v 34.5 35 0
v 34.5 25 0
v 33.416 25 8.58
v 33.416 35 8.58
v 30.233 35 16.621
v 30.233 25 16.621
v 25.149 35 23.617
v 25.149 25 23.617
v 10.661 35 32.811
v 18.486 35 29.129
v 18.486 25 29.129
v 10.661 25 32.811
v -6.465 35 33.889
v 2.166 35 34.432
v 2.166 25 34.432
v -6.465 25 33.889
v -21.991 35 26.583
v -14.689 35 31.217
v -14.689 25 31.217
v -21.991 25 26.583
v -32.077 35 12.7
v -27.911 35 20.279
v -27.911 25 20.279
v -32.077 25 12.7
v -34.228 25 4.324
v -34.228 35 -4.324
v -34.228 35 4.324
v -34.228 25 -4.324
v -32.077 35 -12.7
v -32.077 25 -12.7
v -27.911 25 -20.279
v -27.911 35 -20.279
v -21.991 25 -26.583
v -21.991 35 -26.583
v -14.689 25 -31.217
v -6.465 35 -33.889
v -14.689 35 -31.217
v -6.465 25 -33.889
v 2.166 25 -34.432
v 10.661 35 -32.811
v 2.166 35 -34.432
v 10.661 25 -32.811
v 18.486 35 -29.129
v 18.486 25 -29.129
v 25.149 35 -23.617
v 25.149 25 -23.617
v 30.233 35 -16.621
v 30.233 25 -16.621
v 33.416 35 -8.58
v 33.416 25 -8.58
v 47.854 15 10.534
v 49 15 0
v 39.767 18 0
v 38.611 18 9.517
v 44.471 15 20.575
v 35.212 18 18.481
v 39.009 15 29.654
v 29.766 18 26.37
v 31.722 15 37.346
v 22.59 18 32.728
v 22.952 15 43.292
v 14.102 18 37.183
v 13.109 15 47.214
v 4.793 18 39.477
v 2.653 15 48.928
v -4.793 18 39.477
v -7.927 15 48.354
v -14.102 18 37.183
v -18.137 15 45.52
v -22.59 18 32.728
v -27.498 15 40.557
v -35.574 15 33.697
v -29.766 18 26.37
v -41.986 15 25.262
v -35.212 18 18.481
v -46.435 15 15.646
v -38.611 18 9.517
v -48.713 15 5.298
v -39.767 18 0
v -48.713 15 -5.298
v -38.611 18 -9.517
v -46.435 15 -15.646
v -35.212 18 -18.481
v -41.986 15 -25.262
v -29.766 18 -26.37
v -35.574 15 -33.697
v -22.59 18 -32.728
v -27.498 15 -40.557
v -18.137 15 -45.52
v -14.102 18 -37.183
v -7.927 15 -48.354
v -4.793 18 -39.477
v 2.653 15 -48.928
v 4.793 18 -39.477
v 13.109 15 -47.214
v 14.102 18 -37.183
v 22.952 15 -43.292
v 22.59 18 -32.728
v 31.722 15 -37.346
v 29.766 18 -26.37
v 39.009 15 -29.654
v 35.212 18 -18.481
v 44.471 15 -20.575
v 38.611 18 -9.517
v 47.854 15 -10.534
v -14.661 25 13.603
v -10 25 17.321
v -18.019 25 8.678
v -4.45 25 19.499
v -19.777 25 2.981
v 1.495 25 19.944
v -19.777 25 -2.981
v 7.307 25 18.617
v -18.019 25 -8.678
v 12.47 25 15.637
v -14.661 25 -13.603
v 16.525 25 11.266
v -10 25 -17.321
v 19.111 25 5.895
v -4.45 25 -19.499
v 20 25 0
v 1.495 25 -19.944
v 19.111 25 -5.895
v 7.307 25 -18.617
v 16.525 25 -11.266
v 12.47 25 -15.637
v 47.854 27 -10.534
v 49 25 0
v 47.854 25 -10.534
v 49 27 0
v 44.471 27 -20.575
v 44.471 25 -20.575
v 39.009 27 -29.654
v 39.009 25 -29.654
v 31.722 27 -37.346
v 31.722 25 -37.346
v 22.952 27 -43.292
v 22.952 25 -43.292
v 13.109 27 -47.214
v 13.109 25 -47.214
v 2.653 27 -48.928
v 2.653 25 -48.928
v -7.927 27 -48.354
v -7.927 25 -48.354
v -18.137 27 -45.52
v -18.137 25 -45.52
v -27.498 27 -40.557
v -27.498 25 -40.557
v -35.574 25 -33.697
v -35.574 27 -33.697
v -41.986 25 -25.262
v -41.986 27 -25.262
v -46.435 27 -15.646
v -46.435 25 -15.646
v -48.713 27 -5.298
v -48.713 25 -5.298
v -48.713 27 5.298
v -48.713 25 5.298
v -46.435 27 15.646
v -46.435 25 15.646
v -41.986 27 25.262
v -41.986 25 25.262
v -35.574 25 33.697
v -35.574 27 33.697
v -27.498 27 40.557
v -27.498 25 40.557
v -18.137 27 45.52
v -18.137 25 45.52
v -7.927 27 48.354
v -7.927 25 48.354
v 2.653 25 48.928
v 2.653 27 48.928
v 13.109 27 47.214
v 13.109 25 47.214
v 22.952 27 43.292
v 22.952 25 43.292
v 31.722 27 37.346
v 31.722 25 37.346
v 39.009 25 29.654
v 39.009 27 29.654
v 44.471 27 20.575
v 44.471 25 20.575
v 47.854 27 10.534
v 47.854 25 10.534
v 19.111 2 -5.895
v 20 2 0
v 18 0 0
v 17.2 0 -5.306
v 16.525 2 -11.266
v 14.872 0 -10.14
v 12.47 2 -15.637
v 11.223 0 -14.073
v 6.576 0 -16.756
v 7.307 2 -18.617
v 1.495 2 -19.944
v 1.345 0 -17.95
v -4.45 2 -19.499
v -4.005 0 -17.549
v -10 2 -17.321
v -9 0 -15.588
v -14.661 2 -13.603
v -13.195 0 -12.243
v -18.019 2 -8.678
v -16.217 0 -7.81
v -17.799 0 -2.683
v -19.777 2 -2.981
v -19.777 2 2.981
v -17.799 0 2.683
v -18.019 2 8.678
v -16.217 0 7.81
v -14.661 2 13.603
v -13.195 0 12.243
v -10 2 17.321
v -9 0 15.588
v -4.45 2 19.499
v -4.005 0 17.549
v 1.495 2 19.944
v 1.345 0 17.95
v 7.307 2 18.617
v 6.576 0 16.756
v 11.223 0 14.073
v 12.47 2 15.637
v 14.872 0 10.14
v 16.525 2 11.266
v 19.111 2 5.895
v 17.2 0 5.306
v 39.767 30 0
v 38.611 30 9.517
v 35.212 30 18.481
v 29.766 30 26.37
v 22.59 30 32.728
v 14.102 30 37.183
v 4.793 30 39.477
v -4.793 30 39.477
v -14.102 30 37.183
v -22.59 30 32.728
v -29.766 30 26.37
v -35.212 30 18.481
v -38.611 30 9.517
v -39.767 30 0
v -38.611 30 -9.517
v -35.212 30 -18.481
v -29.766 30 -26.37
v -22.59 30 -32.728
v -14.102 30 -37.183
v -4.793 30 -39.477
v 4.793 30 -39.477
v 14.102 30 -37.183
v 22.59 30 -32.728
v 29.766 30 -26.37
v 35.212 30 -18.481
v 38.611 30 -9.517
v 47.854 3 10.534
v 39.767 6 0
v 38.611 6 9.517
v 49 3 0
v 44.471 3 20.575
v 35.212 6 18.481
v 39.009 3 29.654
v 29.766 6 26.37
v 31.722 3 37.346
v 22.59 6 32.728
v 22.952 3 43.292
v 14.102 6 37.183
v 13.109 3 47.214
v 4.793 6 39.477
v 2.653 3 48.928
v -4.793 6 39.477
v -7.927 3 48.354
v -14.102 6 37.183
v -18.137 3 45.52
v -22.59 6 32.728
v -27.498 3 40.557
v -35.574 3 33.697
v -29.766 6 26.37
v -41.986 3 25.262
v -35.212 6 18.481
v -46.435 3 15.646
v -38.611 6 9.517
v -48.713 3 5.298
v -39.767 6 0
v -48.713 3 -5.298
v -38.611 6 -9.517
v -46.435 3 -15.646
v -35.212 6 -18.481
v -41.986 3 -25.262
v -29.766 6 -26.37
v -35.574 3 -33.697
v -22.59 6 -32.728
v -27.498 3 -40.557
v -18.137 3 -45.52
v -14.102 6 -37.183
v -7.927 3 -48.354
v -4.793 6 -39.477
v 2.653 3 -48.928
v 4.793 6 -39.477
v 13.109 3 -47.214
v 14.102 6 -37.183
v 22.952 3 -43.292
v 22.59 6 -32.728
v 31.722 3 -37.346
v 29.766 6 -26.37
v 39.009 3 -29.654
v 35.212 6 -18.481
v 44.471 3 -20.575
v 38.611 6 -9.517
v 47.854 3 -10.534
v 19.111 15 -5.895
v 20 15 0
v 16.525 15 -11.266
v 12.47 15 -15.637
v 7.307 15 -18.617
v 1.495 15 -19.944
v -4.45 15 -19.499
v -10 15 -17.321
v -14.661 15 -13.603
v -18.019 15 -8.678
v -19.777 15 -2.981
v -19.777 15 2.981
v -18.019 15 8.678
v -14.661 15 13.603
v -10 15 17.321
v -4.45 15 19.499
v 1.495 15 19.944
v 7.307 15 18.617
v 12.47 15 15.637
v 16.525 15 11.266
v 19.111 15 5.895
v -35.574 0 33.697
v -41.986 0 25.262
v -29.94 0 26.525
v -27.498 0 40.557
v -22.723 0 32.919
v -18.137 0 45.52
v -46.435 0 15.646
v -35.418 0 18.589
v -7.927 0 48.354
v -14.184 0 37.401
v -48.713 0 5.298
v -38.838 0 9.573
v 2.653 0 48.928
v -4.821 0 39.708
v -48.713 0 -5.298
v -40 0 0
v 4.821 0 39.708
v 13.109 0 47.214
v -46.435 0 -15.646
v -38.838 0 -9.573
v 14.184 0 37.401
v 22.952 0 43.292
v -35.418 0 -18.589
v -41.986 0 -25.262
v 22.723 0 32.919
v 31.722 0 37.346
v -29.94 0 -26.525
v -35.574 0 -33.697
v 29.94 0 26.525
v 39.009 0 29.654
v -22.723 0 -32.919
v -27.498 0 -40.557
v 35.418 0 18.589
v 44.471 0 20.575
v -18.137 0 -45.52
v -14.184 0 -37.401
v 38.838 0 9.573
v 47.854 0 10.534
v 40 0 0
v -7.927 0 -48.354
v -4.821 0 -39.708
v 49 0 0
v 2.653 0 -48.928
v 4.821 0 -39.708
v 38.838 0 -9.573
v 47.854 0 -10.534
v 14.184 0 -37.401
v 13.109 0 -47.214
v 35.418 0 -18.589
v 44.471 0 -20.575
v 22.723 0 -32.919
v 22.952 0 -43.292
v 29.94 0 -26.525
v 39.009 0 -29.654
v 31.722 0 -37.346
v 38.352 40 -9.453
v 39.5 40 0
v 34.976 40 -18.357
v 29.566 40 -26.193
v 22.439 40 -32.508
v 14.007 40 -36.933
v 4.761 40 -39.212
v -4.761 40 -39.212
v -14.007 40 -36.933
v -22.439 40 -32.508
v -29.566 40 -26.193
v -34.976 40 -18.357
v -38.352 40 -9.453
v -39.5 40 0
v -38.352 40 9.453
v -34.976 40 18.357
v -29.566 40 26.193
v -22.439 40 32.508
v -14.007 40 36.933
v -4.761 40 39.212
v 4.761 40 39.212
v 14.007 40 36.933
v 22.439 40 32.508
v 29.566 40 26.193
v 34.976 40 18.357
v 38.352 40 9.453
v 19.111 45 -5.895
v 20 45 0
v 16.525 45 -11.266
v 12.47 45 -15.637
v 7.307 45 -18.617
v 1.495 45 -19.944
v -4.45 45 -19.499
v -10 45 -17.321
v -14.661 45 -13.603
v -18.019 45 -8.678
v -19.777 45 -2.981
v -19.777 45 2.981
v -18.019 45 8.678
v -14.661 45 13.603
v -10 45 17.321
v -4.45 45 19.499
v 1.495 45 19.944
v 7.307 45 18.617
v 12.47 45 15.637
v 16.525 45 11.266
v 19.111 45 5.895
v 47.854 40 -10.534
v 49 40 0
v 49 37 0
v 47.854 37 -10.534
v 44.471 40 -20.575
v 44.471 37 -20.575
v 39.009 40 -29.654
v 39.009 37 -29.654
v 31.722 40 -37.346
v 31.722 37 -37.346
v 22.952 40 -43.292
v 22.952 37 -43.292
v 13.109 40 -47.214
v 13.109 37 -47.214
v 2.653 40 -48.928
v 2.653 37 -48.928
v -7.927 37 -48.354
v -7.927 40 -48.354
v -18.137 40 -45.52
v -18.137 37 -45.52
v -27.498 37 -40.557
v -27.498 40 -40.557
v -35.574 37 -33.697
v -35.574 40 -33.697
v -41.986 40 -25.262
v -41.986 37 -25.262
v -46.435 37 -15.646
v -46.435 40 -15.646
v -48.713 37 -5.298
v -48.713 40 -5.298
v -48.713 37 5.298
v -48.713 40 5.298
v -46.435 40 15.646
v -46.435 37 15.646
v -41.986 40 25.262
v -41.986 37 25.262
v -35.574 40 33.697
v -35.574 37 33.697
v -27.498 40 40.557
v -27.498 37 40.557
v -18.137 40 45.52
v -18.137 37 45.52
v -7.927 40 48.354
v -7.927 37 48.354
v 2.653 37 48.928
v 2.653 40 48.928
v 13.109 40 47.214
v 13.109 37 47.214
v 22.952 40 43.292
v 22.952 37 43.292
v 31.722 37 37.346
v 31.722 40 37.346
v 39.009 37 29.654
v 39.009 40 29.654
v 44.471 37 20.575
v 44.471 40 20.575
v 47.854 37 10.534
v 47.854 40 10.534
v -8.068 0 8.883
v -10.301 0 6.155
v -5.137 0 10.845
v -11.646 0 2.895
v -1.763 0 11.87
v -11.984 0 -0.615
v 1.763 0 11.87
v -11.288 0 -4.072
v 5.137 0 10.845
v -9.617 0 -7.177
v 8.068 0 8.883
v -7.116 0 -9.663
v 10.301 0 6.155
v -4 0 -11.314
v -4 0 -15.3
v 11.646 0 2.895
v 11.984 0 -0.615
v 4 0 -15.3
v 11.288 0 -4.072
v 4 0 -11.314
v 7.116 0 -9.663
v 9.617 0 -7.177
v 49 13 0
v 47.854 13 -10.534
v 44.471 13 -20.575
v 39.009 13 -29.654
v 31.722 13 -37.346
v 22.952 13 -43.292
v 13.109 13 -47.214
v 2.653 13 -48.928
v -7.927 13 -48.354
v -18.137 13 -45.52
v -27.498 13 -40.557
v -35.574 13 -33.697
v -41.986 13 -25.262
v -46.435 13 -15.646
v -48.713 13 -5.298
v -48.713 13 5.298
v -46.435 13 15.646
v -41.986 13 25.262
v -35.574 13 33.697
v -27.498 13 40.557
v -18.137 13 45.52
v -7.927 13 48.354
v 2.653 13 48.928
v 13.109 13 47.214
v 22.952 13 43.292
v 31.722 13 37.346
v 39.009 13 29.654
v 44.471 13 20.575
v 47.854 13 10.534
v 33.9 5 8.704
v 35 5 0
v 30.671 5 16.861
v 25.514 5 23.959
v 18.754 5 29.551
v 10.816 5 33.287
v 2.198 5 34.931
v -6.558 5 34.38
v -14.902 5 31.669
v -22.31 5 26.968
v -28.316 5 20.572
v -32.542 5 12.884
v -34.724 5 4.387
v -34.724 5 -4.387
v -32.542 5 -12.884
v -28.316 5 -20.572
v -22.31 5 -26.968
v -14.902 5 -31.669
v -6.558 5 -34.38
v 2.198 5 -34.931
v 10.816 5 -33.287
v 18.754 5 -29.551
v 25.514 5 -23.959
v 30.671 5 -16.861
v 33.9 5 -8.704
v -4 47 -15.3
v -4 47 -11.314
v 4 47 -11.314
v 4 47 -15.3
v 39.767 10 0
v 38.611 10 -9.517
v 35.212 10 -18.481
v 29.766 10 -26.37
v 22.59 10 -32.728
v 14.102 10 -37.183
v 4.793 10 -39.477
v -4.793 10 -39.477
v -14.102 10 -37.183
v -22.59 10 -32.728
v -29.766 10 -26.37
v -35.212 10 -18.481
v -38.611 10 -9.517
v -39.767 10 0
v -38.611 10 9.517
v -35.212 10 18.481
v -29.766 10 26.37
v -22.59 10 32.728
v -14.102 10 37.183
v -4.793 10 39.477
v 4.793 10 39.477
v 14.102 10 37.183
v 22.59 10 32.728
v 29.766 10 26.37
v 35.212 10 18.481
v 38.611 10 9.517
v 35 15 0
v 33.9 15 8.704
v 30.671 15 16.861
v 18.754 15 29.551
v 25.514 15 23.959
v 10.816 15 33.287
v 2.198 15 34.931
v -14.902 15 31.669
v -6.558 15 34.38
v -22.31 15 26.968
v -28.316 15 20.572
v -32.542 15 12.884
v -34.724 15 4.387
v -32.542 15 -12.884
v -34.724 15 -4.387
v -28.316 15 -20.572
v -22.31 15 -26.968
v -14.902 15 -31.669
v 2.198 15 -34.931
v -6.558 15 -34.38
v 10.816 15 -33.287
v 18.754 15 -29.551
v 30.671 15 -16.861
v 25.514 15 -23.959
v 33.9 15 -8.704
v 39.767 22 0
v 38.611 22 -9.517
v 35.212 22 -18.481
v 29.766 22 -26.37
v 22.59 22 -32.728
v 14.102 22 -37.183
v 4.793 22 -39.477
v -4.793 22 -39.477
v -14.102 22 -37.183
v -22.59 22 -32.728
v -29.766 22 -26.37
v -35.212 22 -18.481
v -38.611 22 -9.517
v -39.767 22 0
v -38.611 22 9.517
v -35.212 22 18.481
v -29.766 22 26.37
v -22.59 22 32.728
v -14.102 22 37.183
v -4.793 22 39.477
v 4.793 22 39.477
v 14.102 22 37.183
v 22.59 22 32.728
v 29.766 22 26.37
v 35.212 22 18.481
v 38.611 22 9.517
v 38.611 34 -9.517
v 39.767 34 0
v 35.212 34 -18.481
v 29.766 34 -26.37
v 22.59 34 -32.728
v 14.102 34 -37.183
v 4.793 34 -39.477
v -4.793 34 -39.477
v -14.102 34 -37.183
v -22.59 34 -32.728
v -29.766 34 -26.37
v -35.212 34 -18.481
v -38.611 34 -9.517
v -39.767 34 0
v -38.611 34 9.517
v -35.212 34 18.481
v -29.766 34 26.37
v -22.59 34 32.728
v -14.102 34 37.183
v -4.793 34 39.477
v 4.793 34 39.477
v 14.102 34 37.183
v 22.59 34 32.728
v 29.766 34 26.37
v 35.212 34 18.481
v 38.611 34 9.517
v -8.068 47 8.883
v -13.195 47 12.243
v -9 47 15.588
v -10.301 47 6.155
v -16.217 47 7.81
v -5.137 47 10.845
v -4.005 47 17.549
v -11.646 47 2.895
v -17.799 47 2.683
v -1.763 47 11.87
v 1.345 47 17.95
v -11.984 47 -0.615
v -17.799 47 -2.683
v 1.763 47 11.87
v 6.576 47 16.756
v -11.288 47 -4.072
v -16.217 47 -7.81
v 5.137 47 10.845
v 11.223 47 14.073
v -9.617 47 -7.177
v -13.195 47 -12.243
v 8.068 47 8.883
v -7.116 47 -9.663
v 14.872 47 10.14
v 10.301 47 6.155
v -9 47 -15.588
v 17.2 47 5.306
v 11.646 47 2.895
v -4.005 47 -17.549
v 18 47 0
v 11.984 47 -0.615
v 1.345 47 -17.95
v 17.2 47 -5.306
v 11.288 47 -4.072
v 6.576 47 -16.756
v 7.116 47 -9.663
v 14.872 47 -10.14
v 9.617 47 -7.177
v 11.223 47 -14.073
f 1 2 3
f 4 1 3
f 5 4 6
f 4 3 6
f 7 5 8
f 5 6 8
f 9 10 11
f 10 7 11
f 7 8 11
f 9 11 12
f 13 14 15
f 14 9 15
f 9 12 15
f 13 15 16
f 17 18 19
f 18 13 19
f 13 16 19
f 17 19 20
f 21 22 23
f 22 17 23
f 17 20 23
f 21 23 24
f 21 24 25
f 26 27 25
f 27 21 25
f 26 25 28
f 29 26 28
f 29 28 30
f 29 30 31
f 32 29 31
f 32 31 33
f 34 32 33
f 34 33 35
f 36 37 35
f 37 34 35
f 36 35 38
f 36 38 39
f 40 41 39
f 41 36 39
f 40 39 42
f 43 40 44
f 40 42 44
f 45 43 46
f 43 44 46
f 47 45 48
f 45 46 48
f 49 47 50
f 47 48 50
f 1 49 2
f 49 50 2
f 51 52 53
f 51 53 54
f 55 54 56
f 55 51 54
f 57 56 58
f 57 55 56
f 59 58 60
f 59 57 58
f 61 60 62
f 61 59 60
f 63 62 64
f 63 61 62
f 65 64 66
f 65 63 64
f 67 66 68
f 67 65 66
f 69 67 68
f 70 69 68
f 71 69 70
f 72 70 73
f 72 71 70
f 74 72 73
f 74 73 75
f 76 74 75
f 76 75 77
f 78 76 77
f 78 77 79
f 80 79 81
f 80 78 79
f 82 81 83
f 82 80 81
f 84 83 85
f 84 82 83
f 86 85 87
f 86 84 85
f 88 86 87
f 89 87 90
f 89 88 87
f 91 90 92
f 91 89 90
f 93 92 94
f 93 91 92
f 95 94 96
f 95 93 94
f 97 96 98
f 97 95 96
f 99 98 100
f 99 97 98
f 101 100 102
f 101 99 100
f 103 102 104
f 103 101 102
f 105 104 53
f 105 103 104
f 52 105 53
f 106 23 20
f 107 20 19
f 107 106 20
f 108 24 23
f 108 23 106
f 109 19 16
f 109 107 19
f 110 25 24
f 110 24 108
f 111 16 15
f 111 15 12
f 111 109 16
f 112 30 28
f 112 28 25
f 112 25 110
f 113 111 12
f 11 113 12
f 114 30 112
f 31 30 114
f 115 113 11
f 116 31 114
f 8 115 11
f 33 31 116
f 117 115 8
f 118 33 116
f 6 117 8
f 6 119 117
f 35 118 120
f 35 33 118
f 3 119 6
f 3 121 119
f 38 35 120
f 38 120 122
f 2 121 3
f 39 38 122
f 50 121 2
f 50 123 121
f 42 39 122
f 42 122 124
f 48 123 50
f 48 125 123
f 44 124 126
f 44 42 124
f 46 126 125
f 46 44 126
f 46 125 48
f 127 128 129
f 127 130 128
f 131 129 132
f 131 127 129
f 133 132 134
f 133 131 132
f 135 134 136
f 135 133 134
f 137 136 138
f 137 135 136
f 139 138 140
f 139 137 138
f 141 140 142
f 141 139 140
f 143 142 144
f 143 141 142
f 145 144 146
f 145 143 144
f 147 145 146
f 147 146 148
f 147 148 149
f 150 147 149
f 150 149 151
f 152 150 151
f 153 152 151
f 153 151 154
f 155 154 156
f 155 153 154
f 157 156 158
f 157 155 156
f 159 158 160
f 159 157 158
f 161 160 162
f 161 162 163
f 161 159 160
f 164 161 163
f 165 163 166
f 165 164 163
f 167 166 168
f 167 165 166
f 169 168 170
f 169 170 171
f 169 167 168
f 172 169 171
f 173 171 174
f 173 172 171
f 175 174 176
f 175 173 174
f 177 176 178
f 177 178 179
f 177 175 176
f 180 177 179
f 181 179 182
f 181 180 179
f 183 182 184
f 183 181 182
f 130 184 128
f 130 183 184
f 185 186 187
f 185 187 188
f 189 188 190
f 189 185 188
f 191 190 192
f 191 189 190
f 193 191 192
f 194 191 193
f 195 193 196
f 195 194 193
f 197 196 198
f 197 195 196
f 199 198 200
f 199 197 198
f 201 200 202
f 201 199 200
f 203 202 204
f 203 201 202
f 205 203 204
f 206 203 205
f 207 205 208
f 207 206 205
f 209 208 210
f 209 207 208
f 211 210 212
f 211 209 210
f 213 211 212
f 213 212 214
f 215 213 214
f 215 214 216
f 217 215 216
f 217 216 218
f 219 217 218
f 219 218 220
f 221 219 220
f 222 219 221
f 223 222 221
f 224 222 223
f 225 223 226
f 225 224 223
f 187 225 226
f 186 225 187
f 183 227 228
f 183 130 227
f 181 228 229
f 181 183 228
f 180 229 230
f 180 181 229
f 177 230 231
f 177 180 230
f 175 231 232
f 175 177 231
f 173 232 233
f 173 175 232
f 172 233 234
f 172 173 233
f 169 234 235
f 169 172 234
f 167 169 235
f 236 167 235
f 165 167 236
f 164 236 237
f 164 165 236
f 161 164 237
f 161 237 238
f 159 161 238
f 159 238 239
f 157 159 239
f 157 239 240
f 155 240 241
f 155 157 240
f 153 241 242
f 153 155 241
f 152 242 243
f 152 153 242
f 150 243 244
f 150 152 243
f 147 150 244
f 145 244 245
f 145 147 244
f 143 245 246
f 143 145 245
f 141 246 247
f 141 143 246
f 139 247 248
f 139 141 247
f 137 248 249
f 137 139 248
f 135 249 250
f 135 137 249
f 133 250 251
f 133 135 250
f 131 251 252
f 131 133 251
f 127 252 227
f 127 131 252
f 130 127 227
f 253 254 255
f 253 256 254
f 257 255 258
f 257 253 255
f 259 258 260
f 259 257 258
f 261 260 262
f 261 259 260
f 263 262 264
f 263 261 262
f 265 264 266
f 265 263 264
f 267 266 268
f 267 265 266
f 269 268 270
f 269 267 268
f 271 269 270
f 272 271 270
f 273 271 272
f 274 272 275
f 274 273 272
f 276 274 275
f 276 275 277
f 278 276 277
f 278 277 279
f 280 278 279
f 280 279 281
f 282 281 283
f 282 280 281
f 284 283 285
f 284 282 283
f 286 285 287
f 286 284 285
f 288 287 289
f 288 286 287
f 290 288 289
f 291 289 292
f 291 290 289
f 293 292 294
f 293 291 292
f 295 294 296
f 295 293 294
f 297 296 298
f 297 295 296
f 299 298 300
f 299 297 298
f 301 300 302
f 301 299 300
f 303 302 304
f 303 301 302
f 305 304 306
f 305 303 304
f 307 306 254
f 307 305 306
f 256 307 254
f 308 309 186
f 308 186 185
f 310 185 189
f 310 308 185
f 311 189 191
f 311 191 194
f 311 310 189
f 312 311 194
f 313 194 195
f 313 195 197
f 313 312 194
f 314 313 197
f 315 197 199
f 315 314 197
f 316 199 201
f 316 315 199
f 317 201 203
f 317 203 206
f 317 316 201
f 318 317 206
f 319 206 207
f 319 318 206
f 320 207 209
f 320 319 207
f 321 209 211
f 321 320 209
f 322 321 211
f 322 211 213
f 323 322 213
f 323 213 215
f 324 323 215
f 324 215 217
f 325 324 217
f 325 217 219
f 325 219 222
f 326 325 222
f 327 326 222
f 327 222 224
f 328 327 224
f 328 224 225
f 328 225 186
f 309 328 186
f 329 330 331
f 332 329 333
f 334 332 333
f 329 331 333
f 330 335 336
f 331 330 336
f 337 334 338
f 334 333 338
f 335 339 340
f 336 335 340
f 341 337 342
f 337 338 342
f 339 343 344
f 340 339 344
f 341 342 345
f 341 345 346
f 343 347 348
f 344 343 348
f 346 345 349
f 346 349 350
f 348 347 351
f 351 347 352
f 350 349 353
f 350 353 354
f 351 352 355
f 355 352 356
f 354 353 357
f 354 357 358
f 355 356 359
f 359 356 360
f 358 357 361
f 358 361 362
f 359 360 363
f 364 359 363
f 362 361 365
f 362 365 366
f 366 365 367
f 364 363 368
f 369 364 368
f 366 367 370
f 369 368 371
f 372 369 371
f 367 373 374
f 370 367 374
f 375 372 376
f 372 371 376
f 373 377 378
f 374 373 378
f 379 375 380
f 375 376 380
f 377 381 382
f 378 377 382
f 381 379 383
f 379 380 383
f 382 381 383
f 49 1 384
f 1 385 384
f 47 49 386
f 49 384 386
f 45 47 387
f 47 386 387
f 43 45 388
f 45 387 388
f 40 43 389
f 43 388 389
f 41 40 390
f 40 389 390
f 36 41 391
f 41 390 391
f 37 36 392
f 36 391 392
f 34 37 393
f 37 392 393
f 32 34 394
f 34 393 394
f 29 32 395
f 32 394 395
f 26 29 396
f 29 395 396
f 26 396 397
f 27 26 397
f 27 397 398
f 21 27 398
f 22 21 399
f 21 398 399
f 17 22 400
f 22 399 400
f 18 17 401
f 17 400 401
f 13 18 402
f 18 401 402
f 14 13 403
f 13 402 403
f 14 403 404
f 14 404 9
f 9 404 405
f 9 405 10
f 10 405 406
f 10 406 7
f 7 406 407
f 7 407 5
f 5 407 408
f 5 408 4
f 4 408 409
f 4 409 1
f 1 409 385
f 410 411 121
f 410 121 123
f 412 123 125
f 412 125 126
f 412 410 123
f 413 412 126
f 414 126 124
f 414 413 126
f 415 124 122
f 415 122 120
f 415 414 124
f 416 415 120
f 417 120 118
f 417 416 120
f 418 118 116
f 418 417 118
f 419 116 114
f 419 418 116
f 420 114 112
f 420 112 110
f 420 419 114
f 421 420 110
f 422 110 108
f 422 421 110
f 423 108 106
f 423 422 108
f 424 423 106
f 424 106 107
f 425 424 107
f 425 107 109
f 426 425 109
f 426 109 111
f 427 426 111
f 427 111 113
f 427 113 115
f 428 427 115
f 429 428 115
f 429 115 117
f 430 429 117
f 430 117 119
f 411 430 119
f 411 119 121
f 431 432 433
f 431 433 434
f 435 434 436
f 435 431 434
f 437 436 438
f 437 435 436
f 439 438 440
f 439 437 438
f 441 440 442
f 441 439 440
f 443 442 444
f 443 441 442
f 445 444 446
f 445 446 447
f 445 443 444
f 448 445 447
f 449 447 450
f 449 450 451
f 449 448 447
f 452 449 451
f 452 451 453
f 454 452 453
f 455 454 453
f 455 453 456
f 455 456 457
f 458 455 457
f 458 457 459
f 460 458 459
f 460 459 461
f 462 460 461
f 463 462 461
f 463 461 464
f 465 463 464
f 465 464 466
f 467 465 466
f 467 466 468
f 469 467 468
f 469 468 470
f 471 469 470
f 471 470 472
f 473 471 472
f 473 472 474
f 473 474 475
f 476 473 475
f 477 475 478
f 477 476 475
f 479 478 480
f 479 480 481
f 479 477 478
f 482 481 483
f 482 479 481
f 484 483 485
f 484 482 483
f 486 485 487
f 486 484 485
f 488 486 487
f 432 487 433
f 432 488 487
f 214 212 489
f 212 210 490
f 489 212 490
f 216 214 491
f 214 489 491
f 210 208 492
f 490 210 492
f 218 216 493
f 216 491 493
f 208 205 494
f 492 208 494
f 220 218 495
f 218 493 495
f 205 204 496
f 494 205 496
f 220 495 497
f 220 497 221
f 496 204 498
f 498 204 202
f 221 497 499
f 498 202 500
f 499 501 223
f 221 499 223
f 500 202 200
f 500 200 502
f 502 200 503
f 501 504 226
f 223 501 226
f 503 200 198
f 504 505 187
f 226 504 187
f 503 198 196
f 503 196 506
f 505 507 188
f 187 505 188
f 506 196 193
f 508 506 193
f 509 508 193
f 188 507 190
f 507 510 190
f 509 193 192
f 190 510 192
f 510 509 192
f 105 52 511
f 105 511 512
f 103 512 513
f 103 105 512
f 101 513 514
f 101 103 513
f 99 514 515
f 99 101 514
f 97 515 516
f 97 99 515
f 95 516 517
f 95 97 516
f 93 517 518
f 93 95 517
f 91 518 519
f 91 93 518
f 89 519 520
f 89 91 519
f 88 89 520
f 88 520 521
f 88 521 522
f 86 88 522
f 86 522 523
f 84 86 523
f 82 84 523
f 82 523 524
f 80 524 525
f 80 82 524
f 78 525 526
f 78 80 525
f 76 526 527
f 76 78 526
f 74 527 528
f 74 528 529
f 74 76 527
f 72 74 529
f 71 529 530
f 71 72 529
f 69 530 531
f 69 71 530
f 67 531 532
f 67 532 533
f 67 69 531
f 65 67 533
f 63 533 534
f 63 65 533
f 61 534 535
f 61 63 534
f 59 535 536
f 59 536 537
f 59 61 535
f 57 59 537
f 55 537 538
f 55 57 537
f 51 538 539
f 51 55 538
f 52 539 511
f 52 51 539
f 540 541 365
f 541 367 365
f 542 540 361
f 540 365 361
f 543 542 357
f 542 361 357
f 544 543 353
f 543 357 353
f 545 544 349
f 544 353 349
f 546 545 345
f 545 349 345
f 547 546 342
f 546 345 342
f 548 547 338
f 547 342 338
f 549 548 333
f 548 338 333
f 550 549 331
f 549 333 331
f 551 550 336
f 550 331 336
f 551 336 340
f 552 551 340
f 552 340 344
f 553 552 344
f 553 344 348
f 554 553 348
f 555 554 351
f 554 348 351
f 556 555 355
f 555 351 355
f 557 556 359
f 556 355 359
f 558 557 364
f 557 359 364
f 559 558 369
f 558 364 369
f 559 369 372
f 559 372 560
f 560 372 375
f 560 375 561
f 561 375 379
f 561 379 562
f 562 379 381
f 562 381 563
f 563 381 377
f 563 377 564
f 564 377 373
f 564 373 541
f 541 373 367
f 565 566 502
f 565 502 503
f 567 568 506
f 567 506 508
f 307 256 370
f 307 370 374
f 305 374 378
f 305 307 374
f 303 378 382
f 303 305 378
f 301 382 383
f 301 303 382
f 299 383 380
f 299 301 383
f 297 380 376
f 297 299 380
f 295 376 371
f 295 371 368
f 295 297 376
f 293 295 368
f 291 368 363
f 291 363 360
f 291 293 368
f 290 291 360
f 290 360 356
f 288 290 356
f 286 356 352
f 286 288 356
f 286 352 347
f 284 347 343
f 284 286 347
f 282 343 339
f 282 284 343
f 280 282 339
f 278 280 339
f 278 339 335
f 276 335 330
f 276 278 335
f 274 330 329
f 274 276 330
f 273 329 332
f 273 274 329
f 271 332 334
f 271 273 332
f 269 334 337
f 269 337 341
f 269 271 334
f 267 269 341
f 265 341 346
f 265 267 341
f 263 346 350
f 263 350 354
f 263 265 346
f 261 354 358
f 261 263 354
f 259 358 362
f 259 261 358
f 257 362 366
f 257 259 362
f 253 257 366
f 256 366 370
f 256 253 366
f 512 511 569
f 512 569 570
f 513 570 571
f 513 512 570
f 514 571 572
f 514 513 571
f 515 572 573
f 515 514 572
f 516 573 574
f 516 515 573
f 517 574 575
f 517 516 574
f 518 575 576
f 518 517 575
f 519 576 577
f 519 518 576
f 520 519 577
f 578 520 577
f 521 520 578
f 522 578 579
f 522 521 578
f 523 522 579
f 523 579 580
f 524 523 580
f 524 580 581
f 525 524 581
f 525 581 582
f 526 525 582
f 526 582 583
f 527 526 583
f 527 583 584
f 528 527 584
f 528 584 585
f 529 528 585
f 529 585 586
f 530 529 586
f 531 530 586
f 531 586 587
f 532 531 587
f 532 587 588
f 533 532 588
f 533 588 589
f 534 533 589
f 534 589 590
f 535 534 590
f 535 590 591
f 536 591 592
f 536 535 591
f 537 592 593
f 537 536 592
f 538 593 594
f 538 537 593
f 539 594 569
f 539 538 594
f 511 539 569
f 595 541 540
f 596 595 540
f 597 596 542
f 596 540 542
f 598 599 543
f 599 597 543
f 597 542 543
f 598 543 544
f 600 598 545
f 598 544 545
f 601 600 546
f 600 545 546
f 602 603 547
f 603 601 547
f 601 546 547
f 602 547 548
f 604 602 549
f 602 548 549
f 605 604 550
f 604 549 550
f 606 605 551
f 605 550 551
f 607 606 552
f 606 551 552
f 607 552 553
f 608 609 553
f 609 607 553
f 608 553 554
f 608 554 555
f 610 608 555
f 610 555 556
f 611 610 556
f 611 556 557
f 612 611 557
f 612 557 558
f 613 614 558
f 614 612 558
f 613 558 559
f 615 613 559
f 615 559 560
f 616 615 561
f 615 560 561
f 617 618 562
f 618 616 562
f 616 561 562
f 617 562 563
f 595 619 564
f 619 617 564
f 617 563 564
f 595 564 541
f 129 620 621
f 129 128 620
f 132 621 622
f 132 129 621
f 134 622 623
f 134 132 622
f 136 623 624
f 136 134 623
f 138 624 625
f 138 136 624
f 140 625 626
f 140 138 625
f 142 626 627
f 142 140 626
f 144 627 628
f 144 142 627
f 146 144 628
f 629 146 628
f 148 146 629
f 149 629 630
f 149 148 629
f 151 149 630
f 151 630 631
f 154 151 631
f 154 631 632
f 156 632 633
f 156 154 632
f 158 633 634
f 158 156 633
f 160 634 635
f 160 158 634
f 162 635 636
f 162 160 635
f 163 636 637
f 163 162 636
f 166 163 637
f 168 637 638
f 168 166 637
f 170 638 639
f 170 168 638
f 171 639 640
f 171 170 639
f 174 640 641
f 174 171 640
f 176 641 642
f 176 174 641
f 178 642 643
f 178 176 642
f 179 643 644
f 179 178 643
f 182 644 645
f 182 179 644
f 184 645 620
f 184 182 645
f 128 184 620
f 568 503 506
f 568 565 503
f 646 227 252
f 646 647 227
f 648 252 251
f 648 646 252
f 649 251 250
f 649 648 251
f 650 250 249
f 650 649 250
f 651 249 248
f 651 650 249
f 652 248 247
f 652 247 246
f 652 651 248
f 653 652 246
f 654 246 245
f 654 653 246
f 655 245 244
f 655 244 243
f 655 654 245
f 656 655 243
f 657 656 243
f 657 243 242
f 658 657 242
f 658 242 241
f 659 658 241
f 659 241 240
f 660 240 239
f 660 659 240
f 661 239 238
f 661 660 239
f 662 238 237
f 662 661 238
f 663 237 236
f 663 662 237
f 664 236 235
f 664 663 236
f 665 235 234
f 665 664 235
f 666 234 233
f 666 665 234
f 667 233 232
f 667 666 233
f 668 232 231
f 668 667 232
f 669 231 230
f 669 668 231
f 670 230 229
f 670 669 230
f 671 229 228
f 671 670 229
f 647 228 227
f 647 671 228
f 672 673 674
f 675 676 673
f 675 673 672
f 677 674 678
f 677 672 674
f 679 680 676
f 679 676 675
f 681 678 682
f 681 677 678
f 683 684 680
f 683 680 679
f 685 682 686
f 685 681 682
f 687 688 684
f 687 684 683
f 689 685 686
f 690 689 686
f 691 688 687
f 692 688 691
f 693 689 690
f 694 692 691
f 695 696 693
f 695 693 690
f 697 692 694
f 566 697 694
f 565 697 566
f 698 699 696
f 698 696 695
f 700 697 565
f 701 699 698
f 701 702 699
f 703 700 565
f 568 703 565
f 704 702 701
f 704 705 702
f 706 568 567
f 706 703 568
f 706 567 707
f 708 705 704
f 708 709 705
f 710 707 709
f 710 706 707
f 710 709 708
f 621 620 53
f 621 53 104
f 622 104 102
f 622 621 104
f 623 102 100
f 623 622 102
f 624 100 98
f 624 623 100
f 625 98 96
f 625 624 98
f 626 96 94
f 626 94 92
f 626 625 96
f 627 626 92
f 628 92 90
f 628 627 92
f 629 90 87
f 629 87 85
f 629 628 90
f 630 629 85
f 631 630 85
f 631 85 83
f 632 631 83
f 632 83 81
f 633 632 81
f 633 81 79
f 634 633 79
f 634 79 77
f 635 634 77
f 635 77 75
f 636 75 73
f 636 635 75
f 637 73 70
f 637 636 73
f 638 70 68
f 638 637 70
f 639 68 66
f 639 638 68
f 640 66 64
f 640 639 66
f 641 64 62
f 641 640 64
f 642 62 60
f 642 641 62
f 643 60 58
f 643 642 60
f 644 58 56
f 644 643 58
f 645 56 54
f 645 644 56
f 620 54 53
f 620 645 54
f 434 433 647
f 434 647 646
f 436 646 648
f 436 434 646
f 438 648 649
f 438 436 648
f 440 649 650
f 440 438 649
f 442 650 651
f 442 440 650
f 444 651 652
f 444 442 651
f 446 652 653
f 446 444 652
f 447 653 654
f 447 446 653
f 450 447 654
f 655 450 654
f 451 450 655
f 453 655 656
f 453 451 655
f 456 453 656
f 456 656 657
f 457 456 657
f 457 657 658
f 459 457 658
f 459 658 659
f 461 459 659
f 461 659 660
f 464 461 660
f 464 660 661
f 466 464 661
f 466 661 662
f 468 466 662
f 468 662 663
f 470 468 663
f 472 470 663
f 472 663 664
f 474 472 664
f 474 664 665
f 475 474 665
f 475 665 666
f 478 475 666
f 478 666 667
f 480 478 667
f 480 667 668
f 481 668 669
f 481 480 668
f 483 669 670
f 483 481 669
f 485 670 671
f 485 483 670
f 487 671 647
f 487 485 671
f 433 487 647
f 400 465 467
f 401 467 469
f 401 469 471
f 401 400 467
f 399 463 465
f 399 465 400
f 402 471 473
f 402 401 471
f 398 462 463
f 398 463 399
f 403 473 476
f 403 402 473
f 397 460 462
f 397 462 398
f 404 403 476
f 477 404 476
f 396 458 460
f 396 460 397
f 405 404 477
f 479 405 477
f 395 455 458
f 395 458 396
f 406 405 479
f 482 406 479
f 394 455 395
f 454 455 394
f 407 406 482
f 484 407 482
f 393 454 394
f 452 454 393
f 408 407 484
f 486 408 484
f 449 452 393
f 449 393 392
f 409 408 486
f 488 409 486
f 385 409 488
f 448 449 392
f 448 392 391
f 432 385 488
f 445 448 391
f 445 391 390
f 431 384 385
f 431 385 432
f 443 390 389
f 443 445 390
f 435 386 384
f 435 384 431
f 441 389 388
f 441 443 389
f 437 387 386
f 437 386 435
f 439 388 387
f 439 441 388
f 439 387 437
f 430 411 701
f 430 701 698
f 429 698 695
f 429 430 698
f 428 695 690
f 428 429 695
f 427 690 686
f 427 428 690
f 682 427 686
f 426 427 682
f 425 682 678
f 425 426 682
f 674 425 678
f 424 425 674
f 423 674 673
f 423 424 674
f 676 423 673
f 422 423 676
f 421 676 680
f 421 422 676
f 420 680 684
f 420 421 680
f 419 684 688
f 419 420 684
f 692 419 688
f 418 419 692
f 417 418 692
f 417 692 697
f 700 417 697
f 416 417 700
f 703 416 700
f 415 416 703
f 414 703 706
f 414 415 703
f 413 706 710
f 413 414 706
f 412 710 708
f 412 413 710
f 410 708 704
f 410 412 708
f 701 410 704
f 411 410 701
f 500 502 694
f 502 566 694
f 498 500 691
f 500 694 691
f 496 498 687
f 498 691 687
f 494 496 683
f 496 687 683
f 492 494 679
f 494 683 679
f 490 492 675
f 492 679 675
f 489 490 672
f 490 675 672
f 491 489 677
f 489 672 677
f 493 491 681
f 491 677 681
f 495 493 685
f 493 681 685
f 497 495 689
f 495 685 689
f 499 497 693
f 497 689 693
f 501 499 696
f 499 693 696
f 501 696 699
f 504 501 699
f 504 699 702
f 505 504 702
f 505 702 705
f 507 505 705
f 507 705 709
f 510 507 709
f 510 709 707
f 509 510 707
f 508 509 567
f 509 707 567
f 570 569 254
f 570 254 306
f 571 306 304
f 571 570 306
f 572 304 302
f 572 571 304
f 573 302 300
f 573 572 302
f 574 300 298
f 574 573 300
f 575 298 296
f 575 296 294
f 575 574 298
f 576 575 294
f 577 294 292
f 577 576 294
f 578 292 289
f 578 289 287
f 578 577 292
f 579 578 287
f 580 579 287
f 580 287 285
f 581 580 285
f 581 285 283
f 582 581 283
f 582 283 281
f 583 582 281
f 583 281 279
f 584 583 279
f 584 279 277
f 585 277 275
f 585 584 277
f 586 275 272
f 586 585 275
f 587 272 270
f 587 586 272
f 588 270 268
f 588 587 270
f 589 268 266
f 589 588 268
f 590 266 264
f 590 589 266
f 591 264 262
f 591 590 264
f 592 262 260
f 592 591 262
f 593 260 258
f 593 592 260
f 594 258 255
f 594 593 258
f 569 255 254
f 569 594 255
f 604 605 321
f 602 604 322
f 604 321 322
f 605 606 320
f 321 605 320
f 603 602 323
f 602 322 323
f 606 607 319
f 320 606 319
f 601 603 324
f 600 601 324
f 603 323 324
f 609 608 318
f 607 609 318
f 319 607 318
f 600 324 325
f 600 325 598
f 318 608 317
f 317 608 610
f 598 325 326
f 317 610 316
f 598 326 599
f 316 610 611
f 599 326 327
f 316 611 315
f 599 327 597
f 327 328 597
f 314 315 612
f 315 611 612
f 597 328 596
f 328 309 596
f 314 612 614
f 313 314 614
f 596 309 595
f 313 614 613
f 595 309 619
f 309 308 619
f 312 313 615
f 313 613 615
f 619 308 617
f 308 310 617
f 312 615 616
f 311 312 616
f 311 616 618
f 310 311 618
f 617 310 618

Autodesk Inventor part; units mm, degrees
ref_plane "YZ Plane" through (0, 0, 0) normal (1, 0, 0) x (0, 1, 0)
ref_plane "XZ Plane" through (0, 0, 0) normal (0, 1, 0) x (-1, 0, 0)
ref_plane "XY Plane" through (0, 0, 0) normal (0, 0, 1) x (1, 0, 0)
sketch "Sketch1" plane through (0, 0, 0) normal (0, 0, 1) x (1, 0, 0)
  line L0 (0, 0) -> (0, 47)
  line L1 (0, 0) -> (18, 0)
  line L2 (20, 2) -> (20, 15)
  line L3 (20, 15) -> (35, 15)
  line L4 (35, 15) -> (35, 5)
  line L5 (40, 0) -> (49, 0)
  line L6 (49, 0) -> (49, 3)
  line L7 (49, 3) -> (39.7669, 6)
  line L8 (39.7669, 6) -> (39.7669, 10)
  line L9 (39.7669, 10) -> (49, 13)
  line L10 (49, 13) -> (49, 15)
  line L11 (49, 15) -> (39.7669, 18)
  line L12 (39.7669, 18) -> (39.7669, 22)
  line L13 (39.7669, 22) -> (49, 25)
  line L14 (49, 25) -> (49, 27)
  line L15 (49, 27) -> (39.7669, 30)
  line L16 (39.7669, 30) -> (39.7669, 34)
  line L17 (39.7669, 34) -> (49, 37)
  line L18 (49, 37) -> (49, 40)
  line L19 (49, 40) -> (39.5, 40)
  line L20 (34.5, 35) -> (34.5, 25)
  line L21 (34.5, 25) -> (20, 25)
  line L22 (20, 25) -> (20, 45)
  line L23 (18, 47) -> (0, 47)
  line L24 (18, 47) -> (20, 45)
  line L25 (20, 2) -> (18, 0)
  line L26 (35, 5) -> (40, 0)
  line L27 (34.5, 35) -> (39.5, 40)
  point P0 (20, 0)
  point P1 (35, 0)
  point P2 (39.7669, 8)
  point P3 (39.7669, 20)
  point P4 (34.5, 40)
  point P5 (20, 47)
  dimension "d0" = 40
  dimension "d1" = 70
  dimension "d2" = 98
  dimension "d3" = 15
  dimension "d4" = 4
  dimension "d5" = 10
  dimension "d6" = 8
  dimension "d7" = 12
  dimension "d8" = 36
  dimension "d9" = 18
  dimension "d10" = 40
  dimension "d11" = 15
  dimension "d12" = 40
  dimension "d13" = 47
  dimension "d14" = 2
  dimension "d15" = 45
  dimension "d16" = 2
  dimension "d17" = 45
  dimension "d18" = 5
  dimension "d19" = 45
  dimension "d20" = 5
  dimension "d21" = 45
  dimension "d22" = 9.5
revolve "Revolution1" add sketch "Sketch1" angle 360 about axis through (0, 0, 0) along (0, 1, 0)
sketch "Sketch2" plane through (0, 47, 0) normal (0, 1, 0) x (1, 0, 0)
  circle A0 centre (0, 0) radius 12
  line L0 (-4, 11.3137) -> (-4, 15.3)
  line L1 (-4, 15.3) -> (4, 15.3)
  line L2 (4, 15.3) -> (4, 11.3137)
  point P0 (0, -12)
  dimension "d24" = 24
  dimension "d25" = 27.3
  dimension "d26" = 8
extrude "Extrusion1" cut sketch "Sketch2" against normal up to surface (47 mm away)
equation "\"d9\" = 0.5 * d8"
equation "\"d16\" = d14"
equation "\"d17\" = d15"
equation "\"d20\" = d18"
equation "\"d21\" = d19"
properties part number "V-Belt_Pulley_3_Groove"
